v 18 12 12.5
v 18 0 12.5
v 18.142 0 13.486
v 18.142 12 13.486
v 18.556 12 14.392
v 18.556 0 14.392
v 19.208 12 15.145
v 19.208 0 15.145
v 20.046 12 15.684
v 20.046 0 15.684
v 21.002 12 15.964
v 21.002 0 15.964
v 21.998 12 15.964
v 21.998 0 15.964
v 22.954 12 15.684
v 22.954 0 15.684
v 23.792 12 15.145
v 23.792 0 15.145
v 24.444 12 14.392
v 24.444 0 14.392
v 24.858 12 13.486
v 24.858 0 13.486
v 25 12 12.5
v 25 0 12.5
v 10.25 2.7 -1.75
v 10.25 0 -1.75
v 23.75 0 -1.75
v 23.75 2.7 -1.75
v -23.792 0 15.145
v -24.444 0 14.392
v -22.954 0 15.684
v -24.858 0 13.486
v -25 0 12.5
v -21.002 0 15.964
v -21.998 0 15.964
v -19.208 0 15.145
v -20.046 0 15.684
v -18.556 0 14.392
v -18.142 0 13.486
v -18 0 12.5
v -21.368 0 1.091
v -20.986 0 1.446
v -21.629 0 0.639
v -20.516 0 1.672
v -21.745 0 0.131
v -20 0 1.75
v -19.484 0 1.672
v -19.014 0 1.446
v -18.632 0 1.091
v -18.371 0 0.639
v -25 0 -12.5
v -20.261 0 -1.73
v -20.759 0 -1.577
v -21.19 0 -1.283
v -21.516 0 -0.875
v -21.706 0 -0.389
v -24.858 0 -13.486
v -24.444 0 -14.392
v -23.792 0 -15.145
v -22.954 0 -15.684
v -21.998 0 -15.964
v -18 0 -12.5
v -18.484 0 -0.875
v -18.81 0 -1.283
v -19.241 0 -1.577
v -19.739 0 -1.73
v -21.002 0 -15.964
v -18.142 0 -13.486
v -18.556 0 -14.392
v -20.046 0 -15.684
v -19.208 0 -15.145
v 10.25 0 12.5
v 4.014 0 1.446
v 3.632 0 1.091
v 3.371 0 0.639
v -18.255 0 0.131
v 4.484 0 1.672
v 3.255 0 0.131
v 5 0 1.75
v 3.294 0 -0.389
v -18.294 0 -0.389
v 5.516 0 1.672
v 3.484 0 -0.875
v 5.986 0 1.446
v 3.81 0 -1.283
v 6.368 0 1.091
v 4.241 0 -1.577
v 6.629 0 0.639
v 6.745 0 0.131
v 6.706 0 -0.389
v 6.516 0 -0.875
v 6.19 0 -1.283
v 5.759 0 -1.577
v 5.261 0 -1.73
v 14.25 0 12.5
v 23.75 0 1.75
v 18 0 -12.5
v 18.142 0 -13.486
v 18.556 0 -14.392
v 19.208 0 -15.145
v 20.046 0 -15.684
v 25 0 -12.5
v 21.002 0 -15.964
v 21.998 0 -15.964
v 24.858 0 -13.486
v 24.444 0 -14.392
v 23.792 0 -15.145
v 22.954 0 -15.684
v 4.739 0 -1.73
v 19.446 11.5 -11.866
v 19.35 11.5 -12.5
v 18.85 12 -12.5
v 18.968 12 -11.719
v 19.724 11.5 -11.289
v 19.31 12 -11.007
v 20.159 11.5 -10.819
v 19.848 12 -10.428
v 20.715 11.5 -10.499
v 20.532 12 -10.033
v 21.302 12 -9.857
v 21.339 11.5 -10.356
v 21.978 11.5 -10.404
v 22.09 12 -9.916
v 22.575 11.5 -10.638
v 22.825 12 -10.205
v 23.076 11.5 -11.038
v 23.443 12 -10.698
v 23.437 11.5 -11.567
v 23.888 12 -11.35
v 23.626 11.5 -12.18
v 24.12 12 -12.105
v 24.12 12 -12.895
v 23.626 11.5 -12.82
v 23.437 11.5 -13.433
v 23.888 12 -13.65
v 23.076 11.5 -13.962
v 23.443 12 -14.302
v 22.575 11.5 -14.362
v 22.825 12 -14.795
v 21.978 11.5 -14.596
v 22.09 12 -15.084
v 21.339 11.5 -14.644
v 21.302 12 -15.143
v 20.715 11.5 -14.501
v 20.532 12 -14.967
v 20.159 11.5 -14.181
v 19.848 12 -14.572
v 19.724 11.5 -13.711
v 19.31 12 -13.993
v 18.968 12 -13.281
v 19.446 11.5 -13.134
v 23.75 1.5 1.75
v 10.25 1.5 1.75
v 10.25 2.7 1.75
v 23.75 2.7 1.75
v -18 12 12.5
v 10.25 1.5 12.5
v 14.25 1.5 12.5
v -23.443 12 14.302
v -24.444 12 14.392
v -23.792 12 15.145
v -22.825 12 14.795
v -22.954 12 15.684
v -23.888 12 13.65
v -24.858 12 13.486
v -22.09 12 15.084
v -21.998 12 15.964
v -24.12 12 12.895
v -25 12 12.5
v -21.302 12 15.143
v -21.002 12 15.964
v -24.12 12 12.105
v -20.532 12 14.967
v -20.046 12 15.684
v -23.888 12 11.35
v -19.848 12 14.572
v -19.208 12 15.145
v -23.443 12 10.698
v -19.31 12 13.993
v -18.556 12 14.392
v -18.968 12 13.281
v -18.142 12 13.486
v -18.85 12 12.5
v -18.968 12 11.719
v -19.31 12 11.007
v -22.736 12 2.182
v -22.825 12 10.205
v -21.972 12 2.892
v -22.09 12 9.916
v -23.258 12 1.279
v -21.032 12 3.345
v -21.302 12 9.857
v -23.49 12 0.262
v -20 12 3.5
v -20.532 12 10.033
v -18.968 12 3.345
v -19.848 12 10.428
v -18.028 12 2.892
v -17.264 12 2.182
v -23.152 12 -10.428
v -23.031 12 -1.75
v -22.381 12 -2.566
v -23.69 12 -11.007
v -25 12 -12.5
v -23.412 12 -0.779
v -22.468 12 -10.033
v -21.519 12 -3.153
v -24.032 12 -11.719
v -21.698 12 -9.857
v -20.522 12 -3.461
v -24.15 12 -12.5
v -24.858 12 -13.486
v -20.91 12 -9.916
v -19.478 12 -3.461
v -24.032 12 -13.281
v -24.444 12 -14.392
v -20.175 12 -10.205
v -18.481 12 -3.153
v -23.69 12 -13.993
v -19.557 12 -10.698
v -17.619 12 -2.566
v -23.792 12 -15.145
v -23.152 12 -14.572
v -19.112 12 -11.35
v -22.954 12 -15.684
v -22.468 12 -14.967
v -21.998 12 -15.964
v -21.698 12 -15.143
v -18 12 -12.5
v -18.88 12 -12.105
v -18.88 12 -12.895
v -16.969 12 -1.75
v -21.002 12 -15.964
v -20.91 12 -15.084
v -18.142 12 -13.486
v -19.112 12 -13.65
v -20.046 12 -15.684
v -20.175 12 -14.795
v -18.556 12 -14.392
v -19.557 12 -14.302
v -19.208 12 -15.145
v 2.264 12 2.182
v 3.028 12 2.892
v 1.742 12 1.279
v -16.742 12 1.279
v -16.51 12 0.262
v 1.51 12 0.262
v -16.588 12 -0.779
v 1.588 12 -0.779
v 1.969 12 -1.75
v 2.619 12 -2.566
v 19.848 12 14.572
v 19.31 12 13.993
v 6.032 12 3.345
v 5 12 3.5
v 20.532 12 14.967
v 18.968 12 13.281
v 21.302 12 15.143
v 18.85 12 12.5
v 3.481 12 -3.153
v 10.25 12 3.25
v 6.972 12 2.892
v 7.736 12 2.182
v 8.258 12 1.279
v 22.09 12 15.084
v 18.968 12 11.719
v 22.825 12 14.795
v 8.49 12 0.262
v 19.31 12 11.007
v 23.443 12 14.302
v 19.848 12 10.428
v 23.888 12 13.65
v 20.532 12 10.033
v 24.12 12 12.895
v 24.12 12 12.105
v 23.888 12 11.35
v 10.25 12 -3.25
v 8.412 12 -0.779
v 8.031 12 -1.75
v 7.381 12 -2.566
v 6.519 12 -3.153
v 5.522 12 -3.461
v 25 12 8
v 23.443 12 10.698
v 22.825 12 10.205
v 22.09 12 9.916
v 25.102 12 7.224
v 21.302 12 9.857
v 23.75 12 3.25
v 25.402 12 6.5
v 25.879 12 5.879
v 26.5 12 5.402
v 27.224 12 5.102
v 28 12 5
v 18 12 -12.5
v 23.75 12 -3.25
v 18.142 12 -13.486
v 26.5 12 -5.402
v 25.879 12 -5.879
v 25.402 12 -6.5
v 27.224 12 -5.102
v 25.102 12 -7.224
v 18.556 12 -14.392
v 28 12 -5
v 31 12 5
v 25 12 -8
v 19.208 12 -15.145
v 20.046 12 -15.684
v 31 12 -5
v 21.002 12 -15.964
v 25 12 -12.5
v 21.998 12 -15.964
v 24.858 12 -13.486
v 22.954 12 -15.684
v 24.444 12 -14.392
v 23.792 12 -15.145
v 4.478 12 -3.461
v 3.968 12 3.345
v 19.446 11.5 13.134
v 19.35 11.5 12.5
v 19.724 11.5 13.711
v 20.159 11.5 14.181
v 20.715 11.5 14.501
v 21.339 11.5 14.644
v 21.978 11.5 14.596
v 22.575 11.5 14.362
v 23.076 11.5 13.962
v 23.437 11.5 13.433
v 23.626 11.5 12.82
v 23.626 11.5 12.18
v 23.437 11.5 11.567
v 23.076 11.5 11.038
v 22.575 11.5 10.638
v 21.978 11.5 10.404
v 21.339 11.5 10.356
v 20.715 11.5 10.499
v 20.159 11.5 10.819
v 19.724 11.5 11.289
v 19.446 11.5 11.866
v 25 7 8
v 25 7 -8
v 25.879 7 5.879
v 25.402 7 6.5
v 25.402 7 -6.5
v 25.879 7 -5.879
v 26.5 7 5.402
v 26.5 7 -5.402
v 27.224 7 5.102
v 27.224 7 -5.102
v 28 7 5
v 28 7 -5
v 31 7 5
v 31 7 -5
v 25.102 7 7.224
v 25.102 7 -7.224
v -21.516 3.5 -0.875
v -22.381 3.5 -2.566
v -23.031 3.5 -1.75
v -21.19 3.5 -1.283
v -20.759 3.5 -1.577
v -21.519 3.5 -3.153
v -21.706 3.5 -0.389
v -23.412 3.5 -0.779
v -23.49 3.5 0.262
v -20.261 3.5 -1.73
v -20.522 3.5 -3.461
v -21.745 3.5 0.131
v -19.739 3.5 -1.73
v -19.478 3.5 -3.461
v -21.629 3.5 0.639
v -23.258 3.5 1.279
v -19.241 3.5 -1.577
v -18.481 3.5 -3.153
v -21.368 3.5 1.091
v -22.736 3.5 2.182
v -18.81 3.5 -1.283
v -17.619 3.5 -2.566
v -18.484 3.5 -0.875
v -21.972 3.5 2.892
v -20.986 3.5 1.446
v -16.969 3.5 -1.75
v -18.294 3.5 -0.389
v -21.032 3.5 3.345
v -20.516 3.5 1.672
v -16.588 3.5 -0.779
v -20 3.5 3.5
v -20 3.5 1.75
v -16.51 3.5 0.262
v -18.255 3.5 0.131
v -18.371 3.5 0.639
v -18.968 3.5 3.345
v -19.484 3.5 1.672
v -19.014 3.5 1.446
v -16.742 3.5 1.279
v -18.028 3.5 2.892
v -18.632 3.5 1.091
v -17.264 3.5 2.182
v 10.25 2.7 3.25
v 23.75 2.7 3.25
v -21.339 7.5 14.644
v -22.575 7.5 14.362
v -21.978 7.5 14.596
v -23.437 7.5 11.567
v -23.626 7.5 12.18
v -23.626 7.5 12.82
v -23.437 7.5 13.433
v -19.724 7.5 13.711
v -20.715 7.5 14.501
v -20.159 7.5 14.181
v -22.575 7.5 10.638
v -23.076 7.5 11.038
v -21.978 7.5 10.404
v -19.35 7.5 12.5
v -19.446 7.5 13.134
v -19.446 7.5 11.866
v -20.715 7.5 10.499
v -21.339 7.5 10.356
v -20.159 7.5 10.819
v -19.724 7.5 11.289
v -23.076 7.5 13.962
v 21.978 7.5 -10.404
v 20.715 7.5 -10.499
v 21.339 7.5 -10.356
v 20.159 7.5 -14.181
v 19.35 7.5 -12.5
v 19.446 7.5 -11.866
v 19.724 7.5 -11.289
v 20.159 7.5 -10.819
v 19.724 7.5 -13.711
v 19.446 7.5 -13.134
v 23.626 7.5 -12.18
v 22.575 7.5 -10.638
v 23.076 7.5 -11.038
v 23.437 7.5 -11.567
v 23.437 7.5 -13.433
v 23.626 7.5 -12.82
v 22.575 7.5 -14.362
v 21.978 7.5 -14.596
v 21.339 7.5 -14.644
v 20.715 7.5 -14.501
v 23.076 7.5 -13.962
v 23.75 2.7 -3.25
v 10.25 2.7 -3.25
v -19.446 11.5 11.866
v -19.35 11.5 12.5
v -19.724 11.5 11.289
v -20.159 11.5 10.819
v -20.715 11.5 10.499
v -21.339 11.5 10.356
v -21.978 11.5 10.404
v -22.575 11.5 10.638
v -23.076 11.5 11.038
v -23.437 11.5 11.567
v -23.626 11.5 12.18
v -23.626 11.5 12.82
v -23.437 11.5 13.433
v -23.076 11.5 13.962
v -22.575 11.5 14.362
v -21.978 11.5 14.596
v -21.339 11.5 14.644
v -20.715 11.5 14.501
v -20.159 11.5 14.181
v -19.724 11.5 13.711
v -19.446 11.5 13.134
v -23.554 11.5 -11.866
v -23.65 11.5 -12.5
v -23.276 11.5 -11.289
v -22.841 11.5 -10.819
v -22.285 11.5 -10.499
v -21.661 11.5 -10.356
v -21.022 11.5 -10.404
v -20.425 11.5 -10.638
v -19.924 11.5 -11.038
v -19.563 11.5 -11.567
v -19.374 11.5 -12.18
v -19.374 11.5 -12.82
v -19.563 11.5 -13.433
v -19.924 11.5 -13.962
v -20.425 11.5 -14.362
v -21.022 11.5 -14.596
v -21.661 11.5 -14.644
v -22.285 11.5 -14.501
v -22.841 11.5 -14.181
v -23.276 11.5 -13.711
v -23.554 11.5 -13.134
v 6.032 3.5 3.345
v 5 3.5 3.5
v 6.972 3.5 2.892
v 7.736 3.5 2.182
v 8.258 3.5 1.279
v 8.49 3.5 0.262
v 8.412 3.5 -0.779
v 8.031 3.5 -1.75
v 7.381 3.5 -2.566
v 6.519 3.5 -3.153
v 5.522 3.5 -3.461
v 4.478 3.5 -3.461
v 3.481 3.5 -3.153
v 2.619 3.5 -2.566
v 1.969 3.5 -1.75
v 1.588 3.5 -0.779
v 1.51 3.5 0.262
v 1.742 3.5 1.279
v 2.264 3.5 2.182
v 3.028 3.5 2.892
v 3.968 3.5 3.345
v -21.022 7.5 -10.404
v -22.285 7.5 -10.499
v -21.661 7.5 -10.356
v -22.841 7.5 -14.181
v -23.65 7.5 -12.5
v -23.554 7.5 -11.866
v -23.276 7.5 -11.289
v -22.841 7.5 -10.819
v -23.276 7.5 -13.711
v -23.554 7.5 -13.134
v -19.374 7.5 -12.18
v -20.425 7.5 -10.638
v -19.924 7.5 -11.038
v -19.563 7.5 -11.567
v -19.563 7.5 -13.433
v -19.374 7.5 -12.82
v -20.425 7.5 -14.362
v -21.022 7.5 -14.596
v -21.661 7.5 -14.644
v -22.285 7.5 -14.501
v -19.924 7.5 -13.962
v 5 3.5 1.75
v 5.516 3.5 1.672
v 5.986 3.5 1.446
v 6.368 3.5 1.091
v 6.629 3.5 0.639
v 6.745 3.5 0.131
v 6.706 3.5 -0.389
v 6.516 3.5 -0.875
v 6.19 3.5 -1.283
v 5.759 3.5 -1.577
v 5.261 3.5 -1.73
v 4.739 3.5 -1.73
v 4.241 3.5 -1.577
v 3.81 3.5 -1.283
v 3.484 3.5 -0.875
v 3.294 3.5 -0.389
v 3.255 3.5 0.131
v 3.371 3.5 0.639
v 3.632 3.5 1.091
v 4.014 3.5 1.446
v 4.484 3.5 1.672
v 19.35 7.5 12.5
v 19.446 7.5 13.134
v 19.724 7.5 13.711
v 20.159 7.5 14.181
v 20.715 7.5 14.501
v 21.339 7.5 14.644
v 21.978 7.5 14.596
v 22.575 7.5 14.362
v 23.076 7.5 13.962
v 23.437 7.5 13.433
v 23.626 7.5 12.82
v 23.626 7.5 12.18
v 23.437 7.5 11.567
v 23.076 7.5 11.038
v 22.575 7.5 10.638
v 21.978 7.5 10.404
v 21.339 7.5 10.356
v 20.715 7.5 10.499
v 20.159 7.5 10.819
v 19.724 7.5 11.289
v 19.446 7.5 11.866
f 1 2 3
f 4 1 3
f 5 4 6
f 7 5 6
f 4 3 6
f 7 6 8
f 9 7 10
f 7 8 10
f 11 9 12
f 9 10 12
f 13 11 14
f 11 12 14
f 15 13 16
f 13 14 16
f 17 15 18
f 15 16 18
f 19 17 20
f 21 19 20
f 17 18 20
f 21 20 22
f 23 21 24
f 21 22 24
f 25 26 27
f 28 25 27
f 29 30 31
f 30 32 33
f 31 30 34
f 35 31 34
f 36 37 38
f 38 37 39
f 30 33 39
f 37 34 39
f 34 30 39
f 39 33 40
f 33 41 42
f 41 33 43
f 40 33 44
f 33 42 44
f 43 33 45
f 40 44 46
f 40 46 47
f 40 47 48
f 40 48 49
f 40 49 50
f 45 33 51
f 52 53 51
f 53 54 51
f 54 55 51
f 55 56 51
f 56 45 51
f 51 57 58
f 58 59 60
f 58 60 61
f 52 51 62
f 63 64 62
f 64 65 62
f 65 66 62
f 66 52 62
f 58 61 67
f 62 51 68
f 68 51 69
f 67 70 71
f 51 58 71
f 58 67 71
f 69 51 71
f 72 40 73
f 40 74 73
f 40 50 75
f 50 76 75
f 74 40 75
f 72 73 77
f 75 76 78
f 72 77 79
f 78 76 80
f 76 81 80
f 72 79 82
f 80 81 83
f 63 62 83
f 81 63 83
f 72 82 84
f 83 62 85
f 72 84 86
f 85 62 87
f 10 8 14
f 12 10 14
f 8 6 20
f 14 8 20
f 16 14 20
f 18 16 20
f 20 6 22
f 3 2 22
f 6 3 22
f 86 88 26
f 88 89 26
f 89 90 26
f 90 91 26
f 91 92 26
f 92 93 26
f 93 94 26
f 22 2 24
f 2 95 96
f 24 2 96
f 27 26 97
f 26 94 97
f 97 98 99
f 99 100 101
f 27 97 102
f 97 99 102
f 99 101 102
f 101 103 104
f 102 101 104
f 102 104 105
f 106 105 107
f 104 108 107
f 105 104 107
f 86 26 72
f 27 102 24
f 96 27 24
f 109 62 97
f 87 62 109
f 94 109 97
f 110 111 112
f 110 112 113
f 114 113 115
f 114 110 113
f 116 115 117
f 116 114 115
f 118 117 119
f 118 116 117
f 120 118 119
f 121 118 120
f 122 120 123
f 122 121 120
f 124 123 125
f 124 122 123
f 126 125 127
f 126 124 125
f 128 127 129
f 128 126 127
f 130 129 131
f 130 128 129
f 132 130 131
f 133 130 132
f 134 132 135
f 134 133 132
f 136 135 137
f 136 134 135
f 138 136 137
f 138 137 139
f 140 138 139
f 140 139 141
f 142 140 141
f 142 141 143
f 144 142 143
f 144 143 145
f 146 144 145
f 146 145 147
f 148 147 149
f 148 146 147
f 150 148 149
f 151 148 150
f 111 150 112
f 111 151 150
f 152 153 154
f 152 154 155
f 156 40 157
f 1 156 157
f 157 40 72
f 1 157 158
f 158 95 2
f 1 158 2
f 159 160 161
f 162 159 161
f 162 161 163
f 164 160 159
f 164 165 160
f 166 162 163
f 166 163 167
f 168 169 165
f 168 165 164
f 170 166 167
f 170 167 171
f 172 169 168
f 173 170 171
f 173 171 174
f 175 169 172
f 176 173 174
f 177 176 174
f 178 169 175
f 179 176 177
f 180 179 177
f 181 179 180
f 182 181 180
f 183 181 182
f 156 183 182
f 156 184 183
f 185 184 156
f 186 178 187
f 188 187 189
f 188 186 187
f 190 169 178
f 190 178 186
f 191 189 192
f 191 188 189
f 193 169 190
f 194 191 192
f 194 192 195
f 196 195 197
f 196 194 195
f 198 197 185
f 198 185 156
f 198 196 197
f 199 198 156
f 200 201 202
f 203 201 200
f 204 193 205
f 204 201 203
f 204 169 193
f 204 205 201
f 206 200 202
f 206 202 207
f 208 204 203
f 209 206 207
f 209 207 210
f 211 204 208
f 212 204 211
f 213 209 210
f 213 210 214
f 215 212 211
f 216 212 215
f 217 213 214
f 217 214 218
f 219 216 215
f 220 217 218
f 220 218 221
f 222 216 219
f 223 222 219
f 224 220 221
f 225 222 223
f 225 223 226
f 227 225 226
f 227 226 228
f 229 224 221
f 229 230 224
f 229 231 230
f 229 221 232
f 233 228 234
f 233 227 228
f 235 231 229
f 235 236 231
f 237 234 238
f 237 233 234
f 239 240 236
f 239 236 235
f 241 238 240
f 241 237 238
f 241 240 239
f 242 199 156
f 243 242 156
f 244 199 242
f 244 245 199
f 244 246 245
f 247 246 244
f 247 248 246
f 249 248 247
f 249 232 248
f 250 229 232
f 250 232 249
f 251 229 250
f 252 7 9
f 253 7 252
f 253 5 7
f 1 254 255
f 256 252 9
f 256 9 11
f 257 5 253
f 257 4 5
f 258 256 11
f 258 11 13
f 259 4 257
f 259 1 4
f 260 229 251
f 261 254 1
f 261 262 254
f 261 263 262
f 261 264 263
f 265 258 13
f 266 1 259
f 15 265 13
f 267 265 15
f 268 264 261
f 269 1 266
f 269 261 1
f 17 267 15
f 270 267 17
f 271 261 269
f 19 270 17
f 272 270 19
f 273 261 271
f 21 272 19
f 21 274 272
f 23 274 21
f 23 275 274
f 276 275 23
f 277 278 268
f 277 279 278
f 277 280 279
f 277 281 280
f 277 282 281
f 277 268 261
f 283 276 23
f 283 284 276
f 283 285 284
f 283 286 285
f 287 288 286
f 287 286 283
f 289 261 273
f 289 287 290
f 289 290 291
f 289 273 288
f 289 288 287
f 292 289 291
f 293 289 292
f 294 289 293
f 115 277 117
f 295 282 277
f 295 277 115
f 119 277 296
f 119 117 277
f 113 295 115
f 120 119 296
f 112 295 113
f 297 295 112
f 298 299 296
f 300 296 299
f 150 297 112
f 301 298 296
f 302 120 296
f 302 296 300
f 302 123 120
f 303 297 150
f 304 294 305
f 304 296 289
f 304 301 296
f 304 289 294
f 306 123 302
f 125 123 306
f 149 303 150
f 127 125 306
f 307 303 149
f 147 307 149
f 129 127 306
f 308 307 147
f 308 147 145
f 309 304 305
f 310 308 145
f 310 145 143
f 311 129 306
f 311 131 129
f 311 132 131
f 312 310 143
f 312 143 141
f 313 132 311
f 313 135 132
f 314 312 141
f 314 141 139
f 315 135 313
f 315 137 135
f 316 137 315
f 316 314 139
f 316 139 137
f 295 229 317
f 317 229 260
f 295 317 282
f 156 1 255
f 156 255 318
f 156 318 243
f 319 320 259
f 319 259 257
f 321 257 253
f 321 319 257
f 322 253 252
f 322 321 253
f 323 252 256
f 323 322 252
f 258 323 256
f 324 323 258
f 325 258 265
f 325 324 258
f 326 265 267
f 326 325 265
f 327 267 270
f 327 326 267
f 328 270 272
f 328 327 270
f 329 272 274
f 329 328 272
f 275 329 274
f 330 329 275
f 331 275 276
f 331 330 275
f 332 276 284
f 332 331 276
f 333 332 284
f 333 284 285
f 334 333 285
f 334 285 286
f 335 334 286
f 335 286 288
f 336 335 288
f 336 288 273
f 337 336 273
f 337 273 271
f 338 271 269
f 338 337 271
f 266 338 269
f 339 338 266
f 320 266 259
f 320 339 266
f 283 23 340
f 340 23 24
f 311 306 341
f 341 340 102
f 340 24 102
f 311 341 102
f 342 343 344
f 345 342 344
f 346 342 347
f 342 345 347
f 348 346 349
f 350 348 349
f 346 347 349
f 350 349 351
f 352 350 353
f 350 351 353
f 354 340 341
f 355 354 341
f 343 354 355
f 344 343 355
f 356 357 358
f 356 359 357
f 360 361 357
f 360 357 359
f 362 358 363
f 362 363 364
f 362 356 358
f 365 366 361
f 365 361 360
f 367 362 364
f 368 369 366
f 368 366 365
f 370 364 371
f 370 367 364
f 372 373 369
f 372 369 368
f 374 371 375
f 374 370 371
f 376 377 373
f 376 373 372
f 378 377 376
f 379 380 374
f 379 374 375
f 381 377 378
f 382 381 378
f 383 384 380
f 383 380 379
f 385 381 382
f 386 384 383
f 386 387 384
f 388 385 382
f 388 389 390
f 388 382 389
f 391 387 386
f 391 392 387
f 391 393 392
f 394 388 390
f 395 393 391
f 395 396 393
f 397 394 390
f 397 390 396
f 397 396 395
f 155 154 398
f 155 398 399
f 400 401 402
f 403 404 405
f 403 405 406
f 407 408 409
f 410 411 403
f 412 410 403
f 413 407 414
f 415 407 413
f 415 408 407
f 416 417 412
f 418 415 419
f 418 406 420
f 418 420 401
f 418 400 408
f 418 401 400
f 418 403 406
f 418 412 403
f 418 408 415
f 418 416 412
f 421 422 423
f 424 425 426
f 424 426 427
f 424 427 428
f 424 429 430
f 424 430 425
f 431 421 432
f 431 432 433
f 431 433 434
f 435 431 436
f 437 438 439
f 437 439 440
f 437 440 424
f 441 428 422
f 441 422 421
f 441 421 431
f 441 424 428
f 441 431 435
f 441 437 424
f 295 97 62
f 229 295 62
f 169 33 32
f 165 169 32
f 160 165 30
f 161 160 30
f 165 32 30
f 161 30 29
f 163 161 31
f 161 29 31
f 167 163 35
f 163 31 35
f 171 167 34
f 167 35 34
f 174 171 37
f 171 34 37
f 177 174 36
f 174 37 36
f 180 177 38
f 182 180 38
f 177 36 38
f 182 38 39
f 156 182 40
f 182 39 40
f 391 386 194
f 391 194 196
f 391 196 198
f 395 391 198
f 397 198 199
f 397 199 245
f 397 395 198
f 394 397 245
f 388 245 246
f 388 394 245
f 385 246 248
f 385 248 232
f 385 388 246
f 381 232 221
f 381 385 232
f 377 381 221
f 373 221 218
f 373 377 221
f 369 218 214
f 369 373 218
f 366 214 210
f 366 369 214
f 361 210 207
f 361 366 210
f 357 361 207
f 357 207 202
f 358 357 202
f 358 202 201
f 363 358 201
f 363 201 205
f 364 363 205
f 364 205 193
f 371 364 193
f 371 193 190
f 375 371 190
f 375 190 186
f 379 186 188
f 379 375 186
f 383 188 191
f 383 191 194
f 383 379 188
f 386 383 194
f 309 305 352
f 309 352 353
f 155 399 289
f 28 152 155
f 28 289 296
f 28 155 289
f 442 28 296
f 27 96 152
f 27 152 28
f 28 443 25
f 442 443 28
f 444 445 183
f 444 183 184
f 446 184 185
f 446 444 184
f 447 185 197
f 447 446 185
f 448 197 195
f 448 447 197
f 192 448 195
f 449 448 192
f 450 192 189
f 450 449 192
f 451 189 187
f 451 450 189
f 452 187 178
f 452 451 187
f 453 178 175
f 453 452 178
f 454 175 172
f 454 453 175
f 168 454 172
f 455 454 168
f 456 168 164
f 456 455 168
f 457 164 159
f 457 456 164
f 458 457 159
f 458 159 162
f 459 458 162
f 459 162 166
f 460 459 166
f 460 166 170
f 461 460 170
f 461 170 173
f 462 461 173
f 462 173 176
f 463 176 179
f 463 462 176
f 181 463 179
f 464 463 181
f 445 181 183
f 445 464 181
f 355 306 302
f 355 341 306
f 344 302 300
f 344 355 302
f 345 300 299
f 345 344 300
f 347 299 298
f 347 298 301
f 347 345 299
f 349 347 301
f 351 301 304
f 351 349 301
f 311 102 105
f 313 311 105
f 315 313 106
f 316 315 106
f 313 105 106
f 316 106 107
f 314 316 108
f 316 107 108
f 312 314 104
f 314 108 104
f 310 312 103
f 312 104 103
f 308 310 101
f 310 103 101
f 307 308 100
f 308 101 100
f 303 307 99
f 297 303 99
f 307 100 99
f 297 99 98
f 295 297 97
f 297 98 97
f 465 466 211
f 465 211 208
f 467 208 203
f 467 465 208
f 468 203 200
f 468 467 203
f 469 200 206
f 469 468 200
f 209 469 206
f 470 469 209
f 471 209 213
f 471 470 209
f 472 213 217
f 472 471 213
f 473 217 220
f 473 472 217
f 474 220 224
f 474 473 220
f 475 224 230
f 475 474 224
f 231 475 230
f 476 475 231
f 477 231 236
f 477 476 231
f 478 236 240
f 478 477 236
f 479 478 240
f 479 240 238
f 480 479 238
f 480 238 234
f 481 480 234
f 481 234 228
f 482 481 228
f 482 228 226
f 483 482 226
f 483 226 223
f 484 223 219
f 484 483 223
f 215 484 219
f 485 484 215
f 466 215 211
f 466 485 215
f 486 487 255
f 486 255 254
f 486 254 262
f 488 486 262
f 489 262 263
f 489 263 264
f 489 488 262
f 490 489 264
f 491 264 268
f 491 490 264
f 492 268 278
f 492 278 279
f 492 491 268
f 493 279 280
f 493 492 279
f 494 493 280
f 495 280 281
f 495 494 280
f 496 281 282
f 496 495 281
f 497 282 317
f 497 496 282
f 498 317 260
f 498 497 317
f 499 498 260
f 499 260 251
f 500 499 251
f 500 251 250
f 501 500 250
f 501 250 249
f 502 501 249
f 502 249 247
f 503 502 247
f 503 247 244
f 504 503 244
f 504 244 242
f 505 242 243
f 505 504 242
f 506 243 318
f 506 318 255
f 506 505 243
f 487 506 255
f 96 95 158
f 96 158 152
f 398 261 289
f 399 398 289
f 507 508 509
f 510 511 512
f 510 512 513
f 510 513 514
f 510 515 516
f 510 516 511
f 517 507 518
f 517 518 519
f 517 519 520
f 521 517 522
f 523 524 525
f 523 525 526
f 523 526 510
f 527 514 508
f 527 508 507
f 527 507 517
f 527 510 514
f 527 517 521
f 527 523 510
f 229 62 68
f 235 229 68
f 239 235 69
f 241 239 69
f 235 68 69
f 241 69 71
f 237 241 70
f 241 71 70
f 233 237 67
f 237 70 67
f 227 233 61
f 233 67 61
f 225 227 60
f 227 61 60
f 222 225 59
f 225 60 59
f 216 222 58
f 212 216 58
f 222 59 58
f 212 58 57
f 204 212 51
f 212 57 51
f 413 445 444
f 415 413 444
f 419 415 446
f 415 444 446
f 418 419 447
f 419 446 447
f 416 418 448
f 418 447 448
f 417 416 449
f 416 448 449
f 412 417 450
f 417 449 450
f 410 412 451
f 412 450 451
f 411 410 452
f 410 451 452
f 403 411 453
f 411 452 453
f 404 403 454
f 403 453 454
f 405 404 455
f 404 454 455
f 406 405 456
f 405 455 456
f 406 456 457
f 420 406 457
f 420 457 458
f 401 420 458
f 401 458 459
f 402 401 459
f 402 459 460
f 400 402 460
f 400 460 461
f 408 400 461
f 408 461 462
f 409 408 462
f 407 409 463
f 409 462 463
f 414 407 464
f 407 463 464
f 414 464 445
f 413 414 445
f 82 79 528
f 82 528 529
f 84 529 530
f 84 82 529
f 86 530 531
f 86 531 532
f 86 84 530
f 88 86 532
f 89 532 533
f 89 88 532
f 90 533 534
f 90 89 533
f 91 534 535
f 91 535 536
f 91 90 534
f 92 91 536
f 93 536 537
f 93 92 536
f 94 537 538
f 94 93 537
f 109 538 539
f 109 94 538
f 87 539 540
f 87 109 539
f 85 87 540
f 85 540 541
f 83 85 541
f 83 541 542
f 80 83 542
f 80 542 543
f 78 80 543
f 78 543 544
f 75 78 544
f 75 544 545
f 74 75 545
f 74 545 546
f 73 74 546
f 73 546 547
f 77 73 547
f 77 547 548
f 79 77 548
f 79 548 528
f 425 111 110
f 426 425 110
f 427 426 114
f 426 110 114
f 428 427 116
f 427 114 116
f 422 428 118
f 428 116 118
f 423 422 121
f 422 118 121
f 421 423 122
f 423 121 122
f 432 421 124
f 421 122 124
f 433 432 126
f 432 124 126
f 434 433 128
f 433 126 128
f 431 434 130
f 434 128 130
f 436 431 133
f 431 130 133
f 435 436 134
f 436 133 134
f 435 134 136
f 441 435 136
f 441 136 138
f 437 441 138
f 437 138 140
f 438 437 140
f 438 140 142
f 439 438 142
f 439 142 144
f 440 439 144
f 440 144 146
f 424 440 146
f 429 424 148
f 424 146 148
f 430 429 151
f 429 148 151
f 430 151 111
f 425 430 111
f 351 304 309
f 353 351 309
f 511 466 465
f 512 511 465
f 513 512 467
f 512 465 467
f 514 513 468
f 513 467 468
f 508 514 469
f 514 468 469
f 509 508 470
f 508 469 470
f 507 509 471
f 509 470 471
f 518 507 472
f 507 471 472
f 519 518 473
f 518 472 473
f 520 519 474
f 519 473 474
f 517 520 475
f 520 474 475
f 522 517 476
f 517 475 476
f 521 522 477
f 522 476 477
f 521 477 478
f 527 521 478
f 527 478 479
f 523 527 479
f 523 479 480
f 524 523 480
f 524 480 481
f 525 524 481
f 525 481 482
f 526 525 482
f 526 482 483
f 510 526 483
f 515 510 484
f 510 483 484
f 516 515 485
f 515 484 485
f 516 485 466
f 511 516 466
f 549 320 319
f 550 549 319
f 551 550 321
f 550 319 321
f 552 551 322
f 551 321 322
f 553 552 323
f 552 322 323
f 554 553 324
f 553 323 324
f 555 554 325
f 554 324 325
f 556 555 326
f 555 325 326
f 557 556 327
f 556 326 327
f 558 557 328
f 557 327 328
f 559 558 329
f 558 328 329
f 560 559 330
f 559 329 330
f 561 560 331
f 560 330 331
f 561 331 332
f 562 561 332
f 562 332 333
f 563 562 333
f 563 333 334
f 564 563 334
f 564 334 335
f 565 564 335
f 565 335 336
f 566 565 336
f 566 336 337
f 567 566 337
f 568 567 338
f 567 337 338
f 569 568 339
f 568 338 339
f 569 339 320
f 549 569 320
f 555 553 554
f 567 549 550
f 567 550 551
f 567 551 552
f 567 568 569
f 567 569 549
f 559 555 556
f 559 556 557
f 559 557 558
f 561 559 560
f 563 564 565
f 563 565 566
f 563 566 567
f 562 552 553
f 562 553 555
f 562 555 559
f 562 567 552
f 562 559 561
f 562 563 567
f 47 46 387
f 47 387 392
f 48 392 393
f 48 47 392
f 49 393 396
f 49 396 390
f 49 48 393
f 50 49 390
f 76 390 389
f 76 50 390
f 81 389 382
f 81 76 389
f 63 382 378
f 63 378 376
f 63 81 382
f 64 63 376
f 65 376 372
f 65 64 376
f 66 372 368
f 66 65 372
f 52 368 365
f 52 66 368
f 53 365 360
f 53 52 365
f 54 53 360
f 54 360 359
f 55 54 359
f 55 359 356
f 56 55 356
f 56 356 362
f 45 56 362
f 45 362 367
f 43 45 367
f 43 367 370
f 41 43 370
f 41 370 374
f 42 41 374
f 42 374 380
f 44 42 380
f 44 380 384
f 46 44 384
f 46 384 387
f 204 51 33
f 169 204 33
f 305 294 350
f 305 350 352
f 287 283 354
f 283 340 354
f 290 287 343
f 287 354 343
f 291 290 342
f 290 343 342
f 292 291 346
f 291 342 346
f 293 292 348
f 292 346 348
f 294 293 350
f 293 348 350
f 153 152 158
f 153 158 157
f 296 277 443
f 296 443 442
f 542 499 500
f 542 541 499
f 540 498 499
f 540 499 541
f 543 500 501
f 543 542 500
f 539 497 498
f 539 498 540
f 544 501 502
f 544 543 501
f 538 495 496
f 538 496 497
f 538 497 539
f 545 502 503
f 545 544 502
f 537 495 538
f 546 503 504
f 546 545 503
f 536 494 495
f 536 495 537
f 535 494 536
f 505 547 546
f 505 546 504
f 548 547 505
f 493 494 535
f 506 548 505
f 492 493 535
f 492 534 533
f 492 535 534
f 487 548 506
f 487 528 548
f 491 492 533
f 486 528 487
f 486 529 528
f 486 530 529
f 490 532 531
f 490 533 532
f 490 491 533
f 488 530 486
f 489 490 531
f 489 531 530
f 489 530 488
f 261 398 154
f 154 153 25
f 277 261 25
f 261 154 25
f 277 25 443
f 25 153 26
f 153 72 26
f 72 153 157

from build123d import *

# Parameters (mm, degrees)
SKETCH2_W           = 13.5
SKETCH2_H           = 3.5
SKETCH2_R           = 1.75
BOSS_EXTRUDE2_DEPTH = 12
BOSS_EXTRUDE3_START = 12
SKETCH2_4_W         = 6
SKETCH2_4_H         = 10
BOSS_EXTRUDE3_DEPTH = 5
CUT_EXTRUDE1_START  = 12
SKETCH2_6_W         = 13.5
SKETCH2_6_H         = 1.5
CUT_EXTRUDE1_DEPTH  = 9.3
CUT_EXTRUDE2_START  = 12
CUT_EXTRUDE2_DEPTH  = 4.5
CUT_EXTRUDE3_START  = 3.5
SKETCH2_8_R         = 3.5
SKETCH2_8_R_2       = 1.75
CUT_EXTRUDE3_DEPTH  = 8.5
FILLET1_R           = 3
CHAMFER1_SIZE       = 0.5
CUT_EXTRUDE4_DEPTH  = 1.5


with BuildPart() as part:
    # Sketch2 → Boss-Extrude2 (new body)
    with BuildSketch(Plane(origin=(0, 0, 0), x_dir=(1, 0, 0), z_dir=(0, 1, 0))):
        with BuildLine():
            Line((-18, -12.5), (18, -12.5))
            ThreePointArc((18, -12.5), (21.5, -16), (25, -12.5))
            Line((25, -12.5), (25, 12.5))
            ThreePointArc((25, 12.5), (21.5, 16), (18, 12.5))
            Line((18, 12.5), (-18, 12.5))
            ThreePointArc((-18, 12.5), (-21.5, 16), (-25, 12.5))
            Line((-25, 12.5), (-25, -12.5))
            ThreePointArc((-25, -12.5), (-21.5, -16), (-18, -12.5))
        make_face()
        with Locations((17, 0)):
            Rectangle(SKETCH2_W, SKETCH2_H, mode=Mode.SUBTRACT)
        with Locations(Location((-20, 0, 0), (0, 0, 270))):
            Circle(SKETCH2_R, mode=Mode.SUBTRACT)
        with Locations(Location((5, 0, 0), (0, 0, 270))):
            Circle(SKETCH2_R, mode=Mode.SUBTRACT)
    extrude(amount=BOSS_EXTRUDE2_DEPTH)

    # Sketch2<4> → Boss-Extrude3 (add)
    with BuildSketch(Plane(origin=(0, 0, 0), x_dir=(1, 0, 0), z_dir=(0, 1, 0)).offset(BOSS_EXTRUDE3_START)):
        with Locations((28, 0)):
            Rectangle(SKETCH2_4_W, SKETCH2_4_H)
    extrude(amount=-BOSS_EXTRUDE3_DEPTH)

    # Sketch2<6> → Cut-Extrude1 (cut)
    with BuildSketch(Plane(origin=(0, 0, 0), x_dir=(1, 0, 0), z_dir=(0, 1, 0)).offset(CUT_EXTRUDE1_START)):
        with Locations((17, -2.5)):
            Rectangle(SKETCH2_6_W, SKETCH2_6_H)
        with Locations((17, 2.5)):
            Rectangle(SKETCH2_6_W, SKETCH2_6_H)
    extrude(amount=-CUT_EXTRUDE1_DEPTH, mode=Mode.SUBTRACT)

    # Sketch2<7> → Cut-Extrude2 (cut)
    with BuildSketch(Plane(origin=(0, 0, 0), x_dir=(1, 0, 0), z_dir=(0, 1, 0)).offset(CUT_EXTRUDE2_START)):
        with BuildLine():
            ThreePointArc((23.65, 12.5), (21.5, 14.65), (19.35, 12.5))
            Line((19.35, 12.5), (23.65, 12.5))
        make_face()
        with BuildLine():
            Line((23.65, 12.5), (19.35, 12.5))
            ThreePointArc((19.35, 12.5), (21.5, 10.35), (23.65, 12.5))
        make_face()
        with BuildLine():
            ThreePointArc((23.65, -12.5), (21.5, -10.35), (19.35, -12.5))
            Line((19.35, -12.5), (23.65, -12.5))
        make_face()
        with BuildLine():
            Line((23.65, -12.5), (19.35, -12.5))
            ThreePointArc((19.35, -12.5), (21.5, -14.65), (23.65, -12.5))
        make_face()
        with BuildLine():
            ThreePointArc((-19.35, 12.5), (-21.5, 14.65), (-23.65, 12.5))
            Line((-23.65, 12.5), (-19.35, 12.5))
        make_face()
        with BuildLine():
            Line((-19.35, 12.5), (-23.65, 12.5))
            ThreePointArc((-23.65, 12.5), (-21.5, 10.35), (-19.35, 12.5))
        make_face()
        with BuildLine():
            ThreePointArc((-23.65, -12.5), (-21.5, -14.65), (-19.35, -12.5))
            Line((-19.35, -12.5), (-23.65, -12.5))
        make_face()
        with BuildLine():
            Line((-23.65, -12.5), (-19.35, -12.5))
            ThreePointArc((-19.35, -12.5), (-21.5, -10.35), (-23.65, -12.5))
        make_face()
    extrude(amount=-CUT_EXTRUDE2_DEPTH, mode=Mode.SUBTRACT)

    # Sketch2<8> → Cut-Extrude3 (cut)
    # profile 1 of 2: a face of its own
    with BuildSketch(Plane(origin=(0, 0, 0), x_dir=(1, 0, 0), z_dir=(0, 1, 0)).offset(CUT_EXTRUDE3_START)):
        with Locations(Location((-20, 0, 0), (0, 0, 270))):
            Circle(SKETCH2_8_R)
        with Locations(Location((-20, 0, 0), (0, 0, 270))):
            Circle(SKETCH2_8_R_2, mode=Mode.SUBTRACT)
    # profile 2 of 2: a face of its own
    with BuildSketch(Plane(origin=(0, 0, 0), x_dir=(1, 0, 0), z_dir=(0, 1, 0)).offset(CUT_EXTRUDE3_START)):
        with Locations(Location((5, 0, 0), (0, 0, 270))):
            Circle(SKETCH2_8_R)
        with Locations(Location((5, 0, 0), (0, 0, 270))):
            Circle(SKETCH2_8_R_2, mode=Mode.SUBTRACT)
    extrude(amount=CUT_EXTRUDE3_DEPTH, mode=Mode.SUBTRACT)

    # Fillet1
    fillet1_edges = [part.edges().sort_by_distance(p)[0] for p in [
        (25, 9.5, -5),
        (25, 9.5, 5),
    ]]
    fillet(fillet1_edges, radius=FILLET1_R)

    # Chamfer1
    chamfer1_edges = [part.edges().sort_by_distance(p)[0] for p in [
        (19.35, 12, 12.5),
        (-23.65, 12, -12.5),
        (-19.35, 12, 12.5),
        (19.35, 12, -12.5),
    ]]
    chamfer(chamfer1_edges, length=CHAMFER1_SIZE)

    # Sketch3 → Cut-Extrude4 (cut)
    with BuildSketch(Plane.XZ):
        Polygon((10.25, 1.75), (10.25, 12.5), (14.25, 12.5), (23.75, 1.75), align=None)
    extrude(amount=-CUT_EXTRUDE4_DEPTH, mode=Mode.SUBTRACT)


solid = part.part
